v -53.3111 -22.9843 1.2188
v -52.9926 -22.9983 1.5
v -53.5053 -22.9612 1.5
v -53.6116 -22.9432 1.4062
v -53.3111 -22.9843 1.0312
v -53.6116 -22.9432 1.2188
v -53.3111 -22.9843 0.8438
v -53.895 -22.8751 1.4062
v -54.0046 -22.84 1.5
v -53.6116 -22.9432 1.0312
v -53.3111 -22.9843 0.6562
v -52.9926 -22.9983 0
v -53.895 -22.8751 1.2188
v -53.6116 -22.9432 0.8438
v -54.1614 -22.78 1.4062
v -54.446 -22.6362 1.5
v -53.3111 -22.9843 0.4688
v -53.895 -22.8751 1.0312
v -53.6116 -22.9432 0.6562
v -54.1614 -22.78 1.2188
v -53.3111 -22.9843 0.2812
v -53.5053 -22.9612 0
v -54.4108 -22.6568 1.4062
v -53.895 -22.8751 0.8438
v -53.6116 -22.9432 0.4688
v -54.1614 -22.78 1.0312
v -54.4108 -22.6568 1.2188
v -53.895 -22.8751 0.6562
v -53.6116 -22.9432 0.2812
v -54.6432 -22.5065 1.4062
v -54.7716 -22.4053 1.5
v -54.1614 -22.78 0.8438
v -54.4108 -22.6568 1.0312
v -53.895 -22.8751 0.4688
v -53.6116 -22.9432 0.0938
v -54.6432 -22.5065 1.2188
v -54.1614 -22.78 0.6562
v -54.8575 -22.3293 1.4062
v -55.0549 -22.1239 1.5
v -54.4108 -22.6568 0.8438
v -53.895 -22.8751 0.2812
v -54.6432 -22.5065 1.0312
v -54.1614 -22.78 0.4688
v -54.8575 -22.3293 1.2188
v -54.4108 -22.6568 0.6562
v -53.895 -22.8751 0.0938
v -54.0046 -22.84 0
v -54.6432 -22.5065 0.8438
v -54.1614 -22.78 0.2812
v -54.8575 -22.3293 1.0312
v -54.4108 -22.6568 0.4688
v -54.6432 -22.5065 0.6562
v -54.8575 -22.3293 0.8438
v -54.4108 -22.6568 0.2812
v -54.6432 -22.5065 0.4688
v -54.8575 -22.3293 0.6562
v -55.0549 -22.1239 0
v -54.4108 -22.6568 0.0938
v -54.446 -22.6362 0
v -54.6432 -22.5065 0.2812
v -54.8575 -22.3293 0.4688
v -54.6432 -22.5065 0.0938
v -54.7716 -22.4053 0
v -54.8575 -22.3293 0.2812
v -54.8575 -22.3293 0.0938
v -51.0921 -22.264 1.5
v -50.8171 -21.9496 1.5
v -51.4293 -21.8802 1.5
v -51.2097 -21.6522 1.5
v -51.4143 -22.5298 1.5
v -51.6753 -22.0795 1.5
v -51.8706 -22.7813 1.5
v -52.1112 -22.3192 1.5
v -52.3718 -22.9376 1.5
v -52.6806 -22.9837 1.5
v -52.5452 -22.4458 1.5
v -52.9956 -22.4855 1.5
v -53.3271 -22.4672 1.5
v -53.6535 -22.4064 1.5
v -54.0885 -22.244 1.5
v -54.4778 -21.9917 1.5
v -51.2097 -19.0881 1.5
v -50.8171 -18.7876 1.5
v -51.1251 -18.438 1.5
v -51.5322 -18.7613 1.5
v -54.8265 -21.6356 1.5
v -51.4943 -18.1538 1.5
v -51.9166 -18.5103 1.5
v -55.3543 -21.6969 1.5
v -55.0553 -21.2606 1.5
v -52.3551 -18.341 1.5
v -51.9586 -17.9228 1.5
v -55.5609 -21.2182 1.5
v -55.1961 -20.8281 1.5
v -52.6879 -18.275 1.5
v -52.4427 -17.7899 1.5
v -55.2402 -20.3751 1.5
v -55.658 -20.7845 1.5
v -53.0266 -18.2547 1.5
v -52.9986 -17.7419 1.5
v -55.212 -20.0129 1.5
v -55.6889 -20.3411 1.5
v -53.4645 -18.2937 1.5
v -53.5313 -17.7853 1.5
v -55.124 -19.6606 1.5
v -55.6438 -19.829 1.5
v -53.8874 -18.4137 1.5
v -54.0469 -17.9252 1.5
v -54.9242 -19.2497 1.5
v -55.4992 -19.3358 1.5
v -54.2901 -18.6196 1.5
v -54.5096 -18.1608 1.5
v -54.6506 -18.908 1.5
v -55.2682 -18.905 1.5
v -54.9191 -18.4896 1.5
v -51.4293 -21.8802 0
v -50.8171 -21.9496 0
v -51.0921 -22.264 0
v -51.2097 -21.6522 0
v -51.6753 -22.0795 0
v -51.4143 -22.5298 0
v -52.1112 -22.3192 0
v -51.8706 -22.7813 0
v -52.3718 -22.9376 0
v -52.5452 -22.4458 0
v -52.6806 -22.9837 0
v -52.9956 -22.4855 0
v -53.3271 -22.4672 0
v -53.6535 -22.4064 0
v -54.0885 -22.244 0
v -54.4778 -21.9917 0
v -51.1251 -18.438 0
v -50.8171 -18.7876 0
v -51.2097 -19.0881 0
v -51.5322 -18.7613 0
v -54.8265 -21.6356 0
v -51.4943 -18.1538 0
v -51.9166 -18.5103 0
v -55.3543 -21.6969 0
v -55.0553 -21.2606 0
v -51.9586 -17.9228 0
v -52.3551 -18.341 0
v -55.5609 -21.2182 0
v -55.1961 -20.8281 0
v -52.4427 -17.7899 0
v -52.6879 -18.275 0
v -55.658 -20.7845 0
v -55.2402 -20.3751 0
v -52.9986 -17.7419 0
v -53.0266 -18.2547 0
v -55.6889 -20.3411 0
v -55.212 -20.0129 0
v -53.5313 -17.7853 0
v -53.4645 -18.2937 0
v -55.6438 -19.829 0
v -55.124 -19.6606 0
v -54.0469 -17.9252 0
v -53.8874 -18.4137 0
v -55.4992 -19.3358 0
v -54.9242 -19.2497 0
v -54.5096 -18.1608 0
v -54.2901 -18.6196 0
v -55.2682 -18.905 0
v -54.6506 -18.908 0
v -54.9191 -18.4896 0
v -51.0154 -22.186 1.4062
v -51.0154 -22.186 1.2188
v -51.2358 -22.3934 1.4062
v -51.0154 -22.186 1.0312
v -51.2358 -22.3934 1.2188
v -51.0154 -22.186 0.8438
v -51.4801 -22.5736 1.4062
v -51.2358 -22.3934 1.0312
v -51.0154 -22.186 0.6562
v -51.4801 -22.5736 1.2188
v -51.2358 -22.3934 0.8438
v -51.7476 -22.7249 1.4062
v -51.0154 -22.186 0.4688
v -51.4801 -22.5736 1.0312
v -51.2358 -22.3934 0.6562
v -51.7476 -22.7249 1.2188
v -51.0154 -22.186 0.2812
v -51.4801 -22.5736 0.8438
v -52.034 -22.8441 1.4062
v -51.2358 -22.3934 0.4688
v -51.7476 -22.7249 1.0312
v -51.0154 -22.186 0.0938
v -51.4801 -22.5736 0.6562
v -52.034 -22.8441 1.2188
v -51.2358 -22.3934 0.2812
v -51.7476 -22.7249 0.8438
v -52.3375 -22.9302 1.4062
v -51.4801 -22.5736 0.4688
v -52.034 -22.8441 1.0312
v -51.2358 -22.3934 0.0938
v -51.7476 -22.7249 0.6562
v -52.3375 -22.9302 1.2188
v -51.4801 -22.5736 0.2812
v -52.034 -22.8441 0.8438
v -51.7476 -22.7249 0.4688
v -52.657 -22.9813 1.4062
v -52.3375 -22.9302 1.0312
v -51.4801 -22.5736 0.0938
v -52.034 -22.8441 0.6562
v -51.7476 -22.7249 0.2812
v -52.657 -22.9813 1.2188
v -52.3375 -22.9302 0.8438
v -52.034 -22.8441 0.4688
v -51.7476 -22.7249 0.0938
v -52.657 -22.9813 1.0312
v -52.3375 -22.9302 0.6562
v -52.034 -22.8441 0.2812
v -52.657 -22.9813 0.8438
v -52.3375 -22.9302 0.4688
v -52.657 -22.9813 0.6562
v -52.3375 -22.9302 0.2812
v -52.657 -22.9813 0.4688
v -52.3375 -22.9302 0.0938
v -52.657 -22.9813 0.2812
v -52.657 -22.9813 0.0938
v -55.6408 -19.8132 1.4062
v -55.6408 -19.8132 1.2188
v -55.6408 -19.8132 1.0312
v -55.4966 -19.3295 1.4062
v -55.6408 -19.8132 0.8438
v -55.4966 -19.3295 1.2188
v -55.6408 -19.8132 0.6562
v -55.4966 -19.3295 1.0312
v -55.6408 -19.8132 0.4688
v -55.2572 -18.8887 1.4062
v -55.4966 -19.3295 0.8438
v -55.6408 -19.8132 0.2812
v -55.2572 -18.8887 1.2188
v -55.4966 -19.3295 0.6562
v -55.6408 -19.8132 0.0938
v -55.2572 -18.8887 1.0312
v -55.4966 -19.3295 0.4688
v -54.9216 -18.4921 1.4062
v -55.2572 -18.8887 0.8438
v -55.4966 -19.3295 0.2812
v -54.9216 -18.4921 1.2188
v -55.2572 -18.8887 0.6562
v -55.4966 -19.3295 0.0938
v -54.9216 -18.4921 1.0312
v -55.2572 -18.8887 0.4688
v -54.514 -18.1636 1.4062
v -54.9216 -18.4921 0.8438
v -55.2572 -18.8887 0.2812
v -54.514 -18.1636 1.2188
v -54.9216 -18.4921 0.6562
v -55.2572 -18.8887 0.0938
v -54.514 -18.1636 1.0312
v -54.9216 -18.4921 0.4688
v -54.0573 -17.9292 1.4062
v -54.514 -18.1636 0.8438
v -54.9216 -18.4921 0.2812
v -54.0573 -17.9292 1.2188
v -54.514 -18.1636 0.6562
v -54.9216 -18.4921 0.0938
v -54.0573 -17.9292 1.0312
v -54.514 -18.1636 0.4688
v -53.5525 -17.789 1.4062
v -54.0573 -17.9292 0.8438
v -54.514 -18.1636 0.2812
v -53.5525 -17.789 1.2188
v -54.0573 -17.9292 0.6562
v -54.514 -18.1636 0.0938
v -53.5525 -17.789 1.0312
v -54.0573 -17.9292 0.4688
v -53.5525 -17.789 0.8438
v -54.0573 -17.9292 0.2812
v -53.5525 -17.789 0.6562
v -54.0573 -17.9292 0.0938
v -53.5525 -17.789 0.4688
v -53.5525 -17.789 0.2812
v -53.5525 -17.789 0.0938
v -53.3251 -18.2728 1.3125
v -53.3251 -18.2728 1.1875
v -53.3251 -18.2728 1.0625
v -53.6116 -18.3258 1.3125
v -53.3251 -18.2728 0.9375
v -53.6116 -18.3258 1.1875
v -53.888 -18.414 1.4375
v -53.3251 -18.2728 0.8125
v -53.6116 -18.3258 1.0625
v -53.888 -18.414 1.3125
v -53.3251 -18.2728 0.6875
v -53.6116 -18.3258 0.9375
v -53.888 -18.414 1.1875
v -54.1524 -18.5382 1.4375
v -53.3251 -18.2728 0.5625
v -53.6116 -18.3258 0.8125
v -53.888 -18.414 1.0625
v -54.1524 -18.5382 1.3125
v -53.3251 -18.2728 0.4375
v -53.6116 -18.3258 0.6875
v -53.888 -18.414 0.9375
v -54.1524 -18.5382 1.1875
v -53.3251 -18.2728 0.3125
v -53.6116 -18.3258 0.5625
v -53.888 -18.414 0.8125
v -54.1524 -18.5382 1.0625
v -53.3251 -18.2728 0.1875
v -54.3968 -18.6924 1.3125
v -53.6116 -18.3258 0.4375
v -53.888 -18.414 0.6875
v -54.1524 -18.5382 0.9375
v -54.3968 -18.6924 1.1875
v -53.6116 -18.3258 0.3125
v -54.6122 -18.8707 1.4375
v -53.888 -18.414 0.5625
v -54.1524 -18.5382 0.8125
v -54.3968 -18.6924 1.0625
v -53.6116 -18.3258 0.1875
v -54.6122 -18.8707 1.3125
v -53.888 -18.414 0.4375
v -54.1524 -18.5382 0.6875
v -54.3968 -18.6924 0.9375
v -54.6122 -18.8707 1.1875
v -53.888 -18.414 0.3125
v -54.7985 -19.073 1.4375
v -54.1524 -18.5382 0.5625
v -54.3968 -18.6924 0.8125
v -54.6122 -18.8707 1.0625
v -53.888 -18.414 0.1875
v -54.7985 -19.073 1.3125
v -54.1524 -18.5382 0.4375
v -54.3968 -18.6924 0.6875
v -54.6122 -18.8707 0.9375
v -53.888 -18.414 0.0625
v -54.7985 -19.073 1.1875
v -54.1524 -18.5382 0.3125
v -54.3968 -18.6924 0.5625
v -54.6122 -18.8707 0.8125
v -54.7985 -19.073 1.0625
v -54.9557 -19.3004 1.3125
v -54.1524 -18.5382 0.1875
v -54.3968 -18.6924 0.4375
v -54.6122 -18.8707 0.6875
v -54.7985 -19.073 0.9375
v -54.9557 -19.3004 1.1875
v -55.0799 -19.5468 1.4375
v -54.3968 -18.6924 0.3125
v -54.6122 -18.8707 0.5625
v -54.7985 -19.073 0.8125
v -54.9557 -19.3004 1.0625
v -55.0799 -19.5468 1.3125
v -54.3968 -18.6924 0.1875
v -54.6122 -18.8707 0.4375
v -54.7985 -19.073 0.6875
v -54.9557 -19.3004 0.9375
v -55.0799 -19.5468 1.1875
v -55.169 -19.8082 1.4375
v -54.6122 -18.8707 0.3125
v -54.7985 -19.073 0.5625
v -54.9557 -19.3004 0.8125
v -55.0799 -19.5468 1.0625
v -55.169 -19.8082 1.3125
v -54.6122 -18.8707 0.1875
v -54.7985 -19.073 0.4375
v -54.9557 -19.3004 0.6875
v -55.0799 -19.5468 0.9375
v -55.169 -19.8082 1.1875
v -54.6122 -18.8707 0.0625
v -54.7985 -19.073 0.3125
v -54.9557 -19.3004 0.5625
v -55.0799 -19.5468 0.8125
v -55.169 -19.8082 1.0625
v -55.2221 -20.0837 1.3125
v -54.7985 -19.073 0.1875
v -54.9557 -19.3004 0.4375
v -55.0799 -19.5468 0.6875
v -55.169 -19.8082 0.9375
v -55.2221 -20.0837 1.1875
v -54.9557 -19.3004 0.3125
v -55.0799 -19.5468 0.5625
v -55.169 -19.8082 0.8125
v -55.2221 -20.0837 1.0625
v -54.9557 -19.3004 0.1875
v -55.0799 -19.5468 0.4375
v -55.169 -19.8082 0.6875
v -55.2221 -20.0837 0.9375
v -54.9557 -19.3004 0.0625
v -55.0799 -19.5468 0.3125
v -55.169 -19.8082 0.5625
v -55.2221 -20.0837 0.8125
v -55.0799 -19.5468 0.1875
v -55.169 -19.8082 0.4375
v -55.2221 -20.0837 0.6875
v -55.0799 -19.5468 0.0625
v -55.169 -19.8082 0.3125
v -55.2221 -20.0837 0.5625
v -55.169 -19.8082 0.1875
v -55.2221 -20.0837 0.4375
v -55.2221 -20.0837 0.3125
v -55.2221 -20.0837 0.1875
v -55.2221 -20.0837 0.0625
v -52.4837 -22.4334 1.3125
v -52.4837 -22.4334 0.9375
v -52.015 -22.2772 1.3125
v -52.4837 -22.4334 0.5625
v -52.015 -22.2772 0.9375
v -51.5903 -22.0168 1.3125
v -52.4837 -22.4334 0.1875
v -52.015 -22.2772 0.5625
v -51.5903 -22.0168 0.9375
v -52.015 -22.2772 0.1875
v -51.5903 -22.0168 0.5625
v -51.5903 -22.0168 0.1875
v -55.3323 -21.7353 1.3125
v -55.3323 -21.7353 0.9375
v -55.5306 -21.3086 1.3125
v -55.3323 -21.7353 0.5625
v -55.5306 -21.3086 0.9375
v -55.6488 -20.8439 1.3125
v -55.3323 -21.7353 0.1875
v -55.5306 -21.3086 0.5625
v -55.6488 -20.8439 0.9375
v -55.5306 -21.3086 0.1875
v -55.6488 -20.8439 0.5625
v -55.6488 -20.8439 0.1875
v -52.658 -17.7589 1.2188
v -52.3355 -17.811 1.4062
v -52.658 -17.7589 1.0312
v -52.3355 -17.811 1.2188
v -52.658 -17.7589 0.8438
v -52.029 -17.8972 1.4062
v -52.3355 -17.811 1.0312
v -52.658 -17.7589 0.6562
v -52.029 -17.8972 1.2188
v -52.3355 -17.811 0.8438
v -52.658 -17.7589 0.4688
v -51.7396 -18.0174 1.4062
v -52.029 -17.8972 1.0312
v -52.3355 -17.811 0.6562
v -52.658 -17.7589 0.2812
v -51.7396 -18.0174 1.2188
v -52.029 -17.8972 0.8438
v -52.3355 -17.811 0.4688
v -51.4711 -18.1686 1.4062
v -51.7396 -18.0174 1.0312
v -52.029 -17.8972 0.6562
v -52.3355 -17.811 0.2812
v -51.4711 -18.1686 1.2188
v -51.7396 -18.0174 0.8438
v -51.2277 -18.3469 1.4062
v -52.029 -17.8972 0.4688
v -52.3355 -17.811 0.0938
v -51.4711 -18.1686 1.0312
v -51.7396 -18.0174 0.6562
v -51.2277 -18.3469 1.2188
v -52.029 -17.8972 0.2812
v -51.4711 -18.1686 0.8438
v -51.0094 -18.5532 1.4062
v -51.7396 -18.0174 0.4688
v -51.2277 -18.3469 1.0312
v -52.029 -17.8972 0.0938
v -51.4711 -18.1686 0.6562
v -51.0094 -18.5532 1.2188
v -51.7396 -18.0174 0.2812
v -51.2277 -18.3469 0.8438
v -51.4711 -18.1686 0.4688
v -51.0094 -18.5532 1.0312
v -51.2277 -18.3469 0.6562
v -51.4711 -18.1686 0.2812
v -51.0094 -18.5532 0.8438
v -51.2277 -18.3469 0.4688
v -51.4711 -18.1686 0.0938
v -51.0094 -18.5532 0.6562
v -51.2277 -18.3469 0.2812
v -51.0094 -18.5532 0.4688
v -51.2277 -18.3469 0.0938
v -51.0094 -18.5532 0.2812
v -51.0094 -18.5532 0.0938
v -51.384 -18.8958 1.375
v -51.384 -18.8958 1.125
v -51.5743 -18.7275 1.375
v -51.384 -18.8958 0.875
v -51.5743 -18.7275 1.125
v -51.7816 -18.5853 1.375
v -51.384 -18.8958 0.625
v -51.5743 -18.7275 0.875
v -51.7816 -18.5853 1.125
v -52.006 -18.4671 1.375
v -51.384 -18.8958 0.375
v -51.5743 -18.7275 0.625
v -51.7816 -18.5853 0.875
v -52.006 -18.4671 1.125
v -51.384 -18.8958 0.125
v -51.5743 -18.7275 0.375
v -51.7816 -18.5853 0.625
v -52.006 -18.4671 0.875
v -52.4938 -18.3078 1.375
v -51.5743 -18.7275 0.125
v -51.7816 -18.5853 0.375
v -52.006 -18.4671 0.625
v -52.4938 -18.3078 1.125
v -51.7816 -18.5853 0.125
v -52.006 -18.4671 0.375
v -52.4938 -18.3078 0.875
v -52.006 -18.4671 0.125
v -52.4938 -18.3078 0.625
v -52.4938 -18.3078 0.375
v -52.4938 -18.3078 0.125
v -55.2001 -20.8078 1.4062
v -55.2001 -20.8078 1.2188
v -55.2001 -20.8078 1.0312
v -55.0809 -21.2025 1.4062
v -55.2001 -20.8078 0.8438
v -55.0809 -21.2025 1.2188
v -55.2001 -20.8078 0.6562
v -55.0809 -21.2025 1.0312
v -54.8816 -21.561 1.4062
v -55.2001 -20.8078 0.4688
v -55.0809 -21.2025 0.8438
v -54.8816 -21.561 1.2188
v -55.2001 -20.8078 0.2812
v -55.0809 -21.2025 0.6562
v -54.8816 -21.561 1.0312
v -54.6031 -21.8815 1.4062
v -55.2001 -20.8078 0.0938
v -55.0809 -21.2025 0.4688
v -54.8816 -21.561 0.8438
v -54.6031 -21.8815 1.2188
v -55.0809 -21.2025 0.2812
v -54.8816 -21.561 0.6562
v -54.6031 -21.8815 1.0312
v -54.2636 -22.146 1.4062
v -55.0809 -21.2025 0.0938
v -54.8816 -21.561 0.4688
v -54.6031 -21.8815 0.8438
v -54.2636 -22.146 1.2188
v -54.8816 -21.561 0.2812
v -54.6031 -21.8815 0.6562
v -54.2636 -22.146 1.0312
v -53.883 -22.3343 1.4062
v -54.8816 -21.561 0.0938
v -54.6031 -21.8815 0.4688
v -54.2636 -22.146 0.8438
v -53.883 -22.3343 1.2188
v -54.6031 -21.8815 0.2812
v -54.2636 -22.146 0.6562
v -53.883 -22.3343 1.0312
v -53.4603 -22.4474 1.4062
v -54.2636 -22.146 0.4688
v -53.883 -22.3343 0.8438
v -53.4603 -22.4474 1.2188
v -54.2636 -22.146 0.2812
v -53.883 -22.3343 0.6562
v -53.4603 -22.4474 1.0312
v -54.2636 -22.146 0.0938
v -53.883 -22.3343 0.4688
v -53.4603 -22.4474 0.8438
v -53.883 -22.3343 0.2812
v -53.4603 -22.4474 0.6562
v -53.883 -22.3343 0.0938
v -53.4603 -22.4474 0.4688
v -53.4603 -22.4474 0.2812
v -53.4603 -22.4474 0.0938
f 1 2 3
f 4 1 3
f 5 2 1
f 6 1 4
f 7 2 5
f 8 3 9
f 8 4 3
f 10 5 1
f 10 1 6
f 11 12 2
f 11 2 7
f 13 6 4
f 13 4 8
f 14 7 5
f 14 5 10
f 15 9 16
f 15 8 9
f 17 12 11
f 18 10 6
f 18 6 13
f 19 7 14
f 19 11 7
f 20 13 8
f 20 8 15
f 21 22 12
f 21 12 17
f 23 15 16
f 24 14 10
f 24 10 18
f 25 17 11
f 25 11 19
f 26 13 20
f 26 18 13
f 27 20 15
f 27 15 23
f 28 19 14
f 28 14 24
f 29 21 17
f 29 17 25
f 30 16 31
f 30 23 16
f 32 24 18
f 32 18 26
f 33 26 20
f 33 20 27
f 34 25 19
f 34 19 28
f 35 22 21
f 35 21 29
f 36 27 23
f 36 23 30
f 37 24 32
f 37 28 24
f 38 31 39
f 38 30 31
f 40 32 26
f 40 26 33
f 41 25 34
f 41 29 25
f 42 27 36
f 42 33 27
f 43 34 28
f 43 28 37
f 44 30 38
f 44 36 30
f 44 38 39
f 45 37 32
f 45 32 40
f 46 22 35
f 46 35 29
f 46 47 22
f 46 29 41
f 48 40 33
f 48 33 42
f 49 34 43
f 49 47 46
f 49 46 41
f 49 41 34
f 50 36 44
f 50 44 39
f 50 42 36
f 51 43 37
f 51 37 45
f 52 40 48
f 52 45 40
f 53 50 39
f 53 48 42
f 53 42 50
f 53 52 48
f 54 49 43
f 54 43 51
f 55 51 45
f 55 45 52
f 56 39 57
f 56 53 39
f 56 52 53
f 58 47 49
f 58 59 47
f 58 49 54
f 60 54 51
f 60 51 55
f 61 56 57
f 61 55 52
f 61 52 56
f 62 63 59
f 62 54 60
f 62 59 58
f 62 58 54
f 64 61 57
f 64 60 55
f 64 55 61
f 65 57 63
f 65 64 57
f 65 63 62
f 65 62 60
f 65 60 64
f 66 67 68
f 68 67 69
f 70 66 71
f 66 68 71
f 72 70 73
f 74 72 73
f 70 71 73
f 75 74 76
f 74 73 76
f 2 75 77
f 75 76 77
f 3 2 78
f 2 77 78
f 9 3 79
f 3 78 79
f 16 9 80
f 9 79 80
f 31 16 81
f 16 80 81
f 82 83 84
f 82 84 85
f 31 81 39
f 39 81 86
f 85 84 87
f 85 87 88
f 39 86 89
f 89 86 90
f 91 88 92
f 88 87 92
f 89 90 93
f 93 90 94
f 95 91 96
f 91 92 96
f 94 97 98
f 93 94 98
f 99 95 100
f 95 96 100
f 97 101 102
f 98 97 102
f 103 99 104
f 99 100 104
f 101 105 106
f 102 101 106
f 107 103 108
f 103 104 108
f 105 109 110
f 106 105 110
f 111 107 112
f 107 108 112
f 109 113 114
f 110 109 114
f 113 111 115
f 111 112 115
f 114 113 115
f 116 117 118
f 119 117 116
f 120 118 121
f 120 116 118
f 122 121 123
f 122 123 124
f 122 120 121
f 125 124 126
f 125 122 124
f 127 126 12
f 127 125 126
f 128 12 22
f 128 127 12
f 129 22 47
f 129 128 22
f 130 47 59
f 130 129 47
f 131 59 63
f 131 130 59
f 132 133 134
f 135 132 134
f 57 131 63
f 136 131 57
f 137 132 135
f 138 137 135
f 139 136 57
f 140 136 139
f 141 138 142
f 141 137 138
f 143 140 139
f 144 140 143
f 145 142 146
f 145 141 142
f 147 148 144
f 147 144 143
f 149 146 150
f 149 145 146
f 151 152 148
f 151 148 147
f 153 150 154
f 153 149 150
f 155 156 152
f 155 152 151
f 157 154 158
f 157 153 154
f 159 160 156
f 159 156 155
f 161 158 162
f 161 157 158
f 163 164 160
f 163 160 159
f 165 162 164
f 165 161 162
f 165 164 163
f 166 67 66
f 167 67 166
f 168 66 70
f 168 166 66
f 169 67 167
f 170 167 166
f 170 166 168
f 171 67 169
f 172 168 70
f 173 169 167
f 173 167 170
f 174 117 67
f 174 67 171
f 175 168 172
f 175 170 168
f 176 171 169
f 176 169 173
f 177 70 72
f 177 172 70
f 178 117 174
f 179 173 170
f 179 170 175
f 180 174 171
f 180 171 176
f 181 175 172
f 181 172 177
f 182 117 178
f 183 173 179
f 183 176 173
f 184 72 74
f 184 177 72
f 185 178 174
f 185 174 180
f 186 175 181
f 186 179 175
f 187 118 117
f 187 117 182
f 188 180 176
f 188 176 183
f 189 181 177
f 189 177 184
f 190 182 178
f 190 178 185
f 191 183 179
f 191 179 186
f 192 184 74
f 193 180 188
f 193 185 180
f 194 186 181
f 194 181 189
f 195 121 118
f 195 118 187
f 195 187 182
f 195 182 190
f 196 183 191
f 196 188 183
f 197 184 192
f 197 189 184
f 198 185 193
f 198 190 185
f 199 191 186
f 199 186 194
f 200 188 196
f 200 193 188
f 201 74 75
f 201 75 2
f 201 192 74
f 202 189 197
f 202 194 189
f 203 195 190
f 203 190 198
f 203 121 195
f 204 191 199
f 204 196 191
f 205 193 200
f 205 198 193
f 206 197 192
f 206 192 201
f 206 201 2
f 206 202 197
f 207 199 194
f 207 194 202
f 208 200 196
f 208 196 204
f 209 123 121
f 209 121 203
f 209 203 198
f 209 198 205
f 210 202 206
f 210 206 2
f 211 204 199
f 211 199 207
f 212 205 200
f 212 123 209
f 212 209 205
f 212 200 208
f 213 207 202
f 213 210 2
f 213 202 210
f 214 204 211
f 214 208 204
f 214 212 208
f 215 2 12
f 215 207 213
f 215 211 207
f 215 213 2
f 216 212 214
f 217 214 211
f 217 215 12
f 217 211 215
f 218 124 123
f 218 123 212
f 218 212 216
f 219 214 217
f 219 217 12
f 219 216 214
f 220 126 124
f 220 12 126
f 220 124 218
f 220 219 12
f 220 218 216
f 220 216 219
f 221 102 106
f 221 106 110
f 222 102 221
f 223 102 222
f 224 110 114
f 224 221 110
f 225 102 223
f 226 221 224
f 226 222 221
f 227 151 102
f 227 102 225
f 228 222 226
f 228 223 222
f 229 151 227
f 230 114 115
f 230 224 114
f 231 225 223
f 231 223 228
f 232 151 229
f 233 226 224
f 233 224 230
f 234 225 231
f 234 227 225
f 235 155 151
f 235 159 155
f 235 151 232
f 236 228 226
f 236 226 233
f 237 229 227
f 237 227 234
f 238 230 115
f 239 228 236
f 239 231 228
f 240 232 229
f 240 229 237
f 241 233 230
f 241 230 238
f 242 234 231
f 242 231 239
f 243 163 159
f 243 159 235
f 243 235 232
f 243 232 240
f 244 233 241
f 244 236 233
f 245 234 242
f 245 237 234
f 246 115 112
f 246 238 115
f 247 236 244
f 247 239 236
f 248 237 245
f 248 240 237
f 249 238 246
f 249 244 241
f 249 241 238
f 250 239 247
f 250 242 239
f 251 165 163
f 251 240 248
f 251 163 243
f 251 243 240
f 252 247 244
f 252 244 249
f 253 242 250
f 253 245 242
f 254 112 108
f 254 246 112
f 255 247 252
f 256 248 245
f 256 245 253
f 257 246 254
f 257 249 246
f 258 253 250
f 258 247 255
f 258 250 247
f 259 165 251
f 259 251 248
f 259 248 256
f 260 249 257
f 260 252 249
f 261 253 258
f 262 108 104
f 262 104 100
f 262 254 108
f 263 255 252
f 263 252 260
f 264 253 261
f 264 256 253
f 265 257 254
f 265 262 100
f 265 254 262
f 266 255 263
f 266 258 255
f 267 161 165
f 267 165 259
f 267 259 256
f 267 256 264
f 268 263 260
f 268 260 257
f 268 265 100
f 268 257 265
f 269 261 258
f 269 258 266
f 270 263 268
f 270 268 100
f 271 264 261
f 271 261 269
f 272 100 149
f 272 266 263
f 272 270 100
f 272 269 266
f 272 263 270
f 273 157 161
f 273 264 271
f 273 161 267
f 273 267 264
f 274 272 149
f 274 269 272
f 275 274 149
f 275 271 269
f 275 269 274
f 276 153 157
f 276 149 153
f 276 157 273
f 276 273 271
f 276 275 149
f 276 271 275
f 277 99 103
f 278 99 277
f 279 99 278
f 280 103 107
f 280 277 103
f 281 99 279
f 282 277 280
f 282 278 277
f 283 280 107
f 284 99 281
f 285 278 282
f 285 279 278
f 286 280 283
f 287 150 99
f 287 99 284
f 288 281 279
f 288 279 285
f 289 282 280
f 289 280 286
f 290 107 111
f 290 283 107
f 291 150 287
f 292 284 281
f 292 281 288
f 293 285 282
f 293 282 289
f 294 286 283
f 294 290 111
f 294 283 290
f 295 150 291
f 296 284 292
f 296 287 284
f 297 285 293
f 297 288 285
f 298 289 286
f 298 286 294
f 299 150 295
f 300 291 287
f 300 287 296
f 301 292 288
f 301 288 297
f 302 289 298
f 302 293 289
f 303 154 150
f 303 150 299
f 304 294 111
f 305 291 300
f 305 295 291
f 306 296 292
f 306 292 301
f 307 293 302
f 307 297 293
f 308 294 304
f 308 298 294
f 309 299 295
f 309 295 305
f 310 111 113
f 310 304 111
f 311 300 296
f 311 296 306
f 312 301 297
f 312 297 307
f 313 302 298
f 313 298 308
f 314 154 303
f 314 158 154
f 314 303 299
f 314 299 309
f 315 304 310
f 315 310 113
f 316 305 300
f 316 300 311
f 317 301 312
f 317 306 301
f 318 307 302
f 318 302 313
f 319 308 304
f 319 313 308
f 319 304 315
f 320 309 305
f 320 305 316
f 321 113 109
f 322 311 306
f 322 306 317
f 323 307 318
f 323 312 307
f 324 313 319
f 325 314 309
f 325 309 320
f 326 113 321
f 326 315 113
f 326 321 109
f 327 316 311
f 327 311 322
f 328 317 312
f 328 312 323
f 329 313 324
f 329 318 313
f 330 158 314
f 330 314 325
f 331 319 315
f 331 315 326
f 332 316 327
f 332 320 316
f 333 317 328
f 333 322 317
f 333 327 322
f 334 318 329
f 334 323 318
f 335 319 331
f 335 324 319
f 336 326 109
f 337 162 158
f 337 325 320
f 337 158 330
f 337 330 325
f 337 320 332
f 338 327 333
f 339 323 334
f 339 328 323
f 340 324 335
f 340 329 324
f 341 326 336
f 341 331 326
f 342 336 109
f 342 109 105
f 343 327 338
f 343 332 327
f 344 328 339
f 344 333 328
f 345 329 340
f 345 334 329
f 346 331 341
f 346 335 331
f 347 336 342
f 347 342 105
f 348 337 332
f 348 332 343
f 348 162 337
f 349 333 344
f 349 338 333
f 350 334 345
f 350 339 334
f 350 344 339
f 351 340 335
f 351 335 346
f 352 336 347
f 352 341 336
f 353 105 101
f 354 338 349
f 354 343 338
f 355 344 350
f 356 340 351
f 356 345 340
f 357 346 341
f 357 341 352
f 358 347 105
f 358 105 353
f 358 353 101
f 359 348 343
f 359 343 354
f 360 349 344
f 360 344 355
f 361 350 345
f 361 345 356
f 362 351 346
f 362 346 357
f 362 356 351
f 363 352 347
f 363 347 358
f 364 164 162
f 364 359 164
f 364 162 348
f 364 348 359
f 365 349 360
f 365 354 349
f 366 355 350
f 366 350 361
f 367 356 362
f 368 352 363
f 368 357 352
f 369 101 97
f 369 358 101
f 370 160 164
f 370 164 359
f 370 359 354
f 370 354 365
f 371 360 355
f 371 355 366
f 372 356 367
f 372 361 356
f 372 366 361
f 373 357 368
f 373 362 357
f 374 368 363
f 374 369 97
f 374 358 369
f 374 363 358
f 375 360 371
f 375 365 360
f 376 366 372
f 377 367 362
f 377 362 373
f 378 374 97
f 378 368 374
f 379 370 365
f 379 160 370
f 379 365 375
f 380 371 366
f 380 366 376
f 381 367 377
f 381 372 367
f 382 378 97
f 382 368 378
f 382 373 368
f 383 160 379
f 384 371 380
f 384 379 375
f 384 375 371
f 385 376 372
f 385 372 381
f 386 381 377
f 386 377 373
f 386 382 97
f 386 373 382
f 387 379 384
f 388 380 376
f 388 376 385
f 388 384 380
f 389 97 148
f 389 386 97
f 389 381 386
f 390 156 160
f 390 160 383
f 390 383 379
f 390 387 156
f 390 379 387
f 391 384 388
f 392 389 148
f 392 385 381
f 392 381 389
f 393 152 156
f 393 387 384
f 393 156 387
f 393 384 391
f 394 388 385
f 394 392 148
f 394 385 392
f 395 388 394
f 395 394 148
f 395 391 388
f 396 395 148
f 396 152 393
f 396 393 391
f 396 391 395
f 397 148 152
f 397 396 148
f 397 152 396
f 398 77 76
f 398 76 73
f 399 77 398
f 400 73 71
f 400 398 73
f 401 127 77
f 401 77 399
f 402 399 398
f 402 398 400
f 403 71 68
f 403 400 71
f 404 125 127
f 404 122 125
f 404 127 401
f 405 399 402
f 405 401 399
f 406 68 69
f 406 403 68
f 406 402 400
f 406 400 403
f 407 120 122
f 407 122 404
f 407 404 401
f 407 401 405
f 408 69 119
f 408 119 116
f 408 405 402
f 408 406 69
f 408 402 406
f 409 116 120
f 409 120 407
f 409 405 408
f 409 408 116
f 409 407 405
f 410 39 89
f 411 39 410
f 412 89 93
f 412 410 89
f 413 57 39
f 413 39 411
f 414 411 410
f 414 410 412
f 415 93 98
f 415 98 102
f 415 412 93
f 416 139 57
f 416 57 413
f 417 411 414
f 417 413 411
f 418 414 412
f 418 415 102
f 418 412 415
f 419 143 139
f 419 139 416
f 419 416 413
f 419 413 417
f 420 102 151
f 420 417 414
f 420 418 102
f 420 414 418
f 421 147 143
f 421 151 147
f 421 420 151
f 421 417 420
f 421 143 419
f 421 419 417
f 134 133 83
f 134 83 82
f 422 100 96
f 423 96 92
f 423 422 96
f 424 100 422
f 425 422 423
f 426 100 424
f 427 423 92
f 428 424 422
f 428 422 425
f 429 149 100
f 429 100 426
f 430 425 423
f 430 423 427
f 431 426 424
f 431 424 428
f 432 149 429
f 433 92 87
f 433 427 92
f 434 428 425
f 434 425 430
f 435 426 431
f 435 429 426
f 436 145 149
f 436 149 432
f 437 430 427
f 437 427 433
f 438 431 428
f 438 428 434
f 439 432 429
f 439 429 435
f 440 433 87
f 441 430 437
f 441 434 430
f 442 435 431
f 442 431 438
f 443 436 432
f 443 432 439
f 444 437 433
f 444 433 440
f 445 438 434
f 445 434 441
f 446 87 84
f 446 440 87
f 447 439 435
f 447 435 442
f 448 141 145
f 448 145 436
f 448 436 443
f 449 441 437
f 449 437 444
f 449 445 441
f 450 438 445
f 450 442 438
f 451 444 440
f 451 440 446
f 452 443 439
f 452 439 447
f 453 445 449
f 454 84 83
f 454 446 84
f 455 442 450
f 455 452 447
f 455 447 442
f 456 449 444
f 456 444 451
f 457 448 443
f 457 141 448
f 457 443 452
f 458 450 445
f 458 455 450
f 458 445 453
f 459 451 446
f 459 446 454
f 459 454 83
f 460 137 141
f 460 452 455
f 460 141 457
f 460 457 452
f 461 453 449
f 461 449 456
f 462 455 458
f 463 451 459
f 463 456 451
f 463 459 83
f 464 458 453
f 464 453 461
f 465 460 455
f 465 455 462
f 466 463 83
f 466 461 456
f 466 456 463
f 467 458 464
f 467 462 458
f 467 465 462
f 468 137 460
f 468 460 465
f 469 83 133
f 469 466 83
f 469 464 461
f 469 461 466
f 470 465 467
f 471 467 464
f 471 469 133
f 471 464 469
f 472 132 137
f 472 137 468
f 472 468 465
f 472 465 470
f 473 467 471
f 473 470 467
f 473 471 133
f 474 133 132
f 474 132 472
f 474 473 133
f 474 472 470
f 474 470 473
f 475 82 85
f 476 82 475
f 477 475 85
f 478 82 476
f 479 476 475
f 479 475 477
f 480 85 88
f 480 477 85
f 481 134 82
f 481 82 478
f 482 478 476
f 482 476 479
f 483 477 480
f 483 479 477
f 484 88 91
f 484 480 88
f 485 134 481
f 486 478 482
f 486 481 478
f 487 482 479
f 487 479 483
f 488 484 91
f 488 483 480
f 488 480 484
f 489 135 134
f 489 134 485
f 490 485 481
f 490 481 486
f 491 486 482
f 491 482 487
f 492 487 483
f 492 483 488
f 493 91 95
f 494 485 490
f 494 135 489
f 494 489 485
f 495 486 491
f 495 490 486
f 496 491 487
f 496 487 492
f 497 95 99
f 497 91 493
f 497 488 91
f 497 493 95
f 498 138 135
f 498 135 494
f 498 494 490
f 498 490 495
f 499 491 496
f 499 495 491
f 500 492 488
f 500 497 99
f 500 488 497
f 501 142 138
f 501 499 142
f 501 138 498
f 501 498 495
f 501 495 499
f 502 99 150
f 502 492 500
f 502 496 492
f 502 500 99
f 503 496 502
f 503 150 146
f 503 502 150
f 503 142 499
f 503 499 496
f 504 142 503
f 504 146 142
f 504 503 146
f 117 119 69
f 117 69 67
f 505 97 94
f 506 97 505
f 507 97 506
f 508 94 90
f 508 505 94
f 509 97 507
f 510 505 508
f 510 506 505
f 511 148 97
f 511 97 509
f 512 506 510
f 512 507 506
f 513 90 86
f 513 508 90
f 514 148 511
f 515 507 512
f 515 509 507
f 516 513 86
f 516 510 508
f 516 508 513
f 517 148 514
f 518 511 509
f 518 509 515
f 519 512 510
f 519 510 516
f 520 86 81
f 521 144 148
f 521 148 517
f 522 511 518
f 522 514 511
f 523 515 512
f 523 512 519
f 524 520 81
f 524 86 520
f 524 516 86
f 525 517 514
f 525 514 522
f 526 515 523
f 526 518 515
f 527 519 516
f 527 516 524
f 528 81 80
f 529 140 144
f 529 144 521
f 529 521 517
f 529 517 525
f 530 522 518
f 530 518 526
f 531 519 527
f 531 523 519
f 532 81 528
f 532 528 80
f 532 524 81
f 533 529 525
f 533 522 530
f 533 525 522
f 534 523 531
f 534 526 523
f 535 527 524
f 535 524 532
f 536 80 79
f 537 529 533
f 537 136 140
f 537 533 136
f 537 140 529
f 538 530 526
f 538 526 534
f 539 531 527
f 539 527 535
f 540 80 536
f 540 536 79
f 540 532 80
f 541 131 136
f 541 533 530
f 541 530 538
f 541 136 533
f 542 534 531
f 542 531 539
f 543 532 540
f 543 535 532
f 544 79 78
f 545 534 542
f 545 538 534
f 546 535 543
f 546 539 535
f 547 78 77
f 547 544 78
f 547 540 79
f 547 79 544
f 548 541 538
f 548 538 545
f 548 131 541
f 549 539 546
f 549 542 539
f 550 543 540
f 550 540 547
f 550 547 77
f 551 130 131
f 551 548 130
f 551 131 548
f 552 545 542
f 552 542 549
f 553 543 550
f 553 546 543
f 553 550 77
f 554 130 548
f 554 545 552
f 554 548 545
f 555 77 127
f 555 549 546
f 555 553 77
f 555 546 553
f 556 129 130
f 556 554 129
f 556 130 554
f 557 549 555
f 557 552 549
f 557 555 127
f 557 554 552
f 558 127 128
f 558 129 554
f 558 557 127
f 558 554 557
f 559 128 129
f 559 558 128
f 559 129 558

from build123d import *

# Parameters (mm, degrees)
BOSS_EXTRU_1_DEPTH = 1.5


with BuildPart() as part:
    # Esquisse1 → Boss.-Extru.1 (new body)
    with BuildSketch(Plane.XY):
        with BuildLine():
            Line((-50.81708071, -18.787587025), (-51.209708916, -19.088067794))
            add(Edge.make_bspline(
                [(-51.209708916, -19.088067794), (-51.237717328, -19.054687837), (-51.293356537, -18.988377958), (-51.382869684, -18.895264323), (-51.476157745, -18.808028235), (-51.573185061, -18.726254121), (-51.675698089, -18.652801599), (-51.781213516, -18.58384288), (-51.891496437, -18.522031826), (-52.043998915, -18.447084703), (-52.243495841, -18.36887591), (-52.494631326, -18.303299865), (-52.756790038, -18.261555329), (-52.935643752, -18.257034127), (-53.026615967, -18.254734461)],
                knots=[0, 0, 0, 0, 0.757959112, 1.505699292, 2.245454638, 2.979532153, 3.711538275, 4.438200793, 5.171680507, 5.909471876, 7.393775596, 8.890124382, 10.418191784, 12, 12, 12, 12], degree=3))
            add(Edge.make_bspline(
                [(-53.026615967, -18.254734461), (-53.076734966, -18.25531155), (-53.176507812, -18.256460373), (-53.32457706, -18.271616266), (-53.469881419, -18.292917995), (-53.612326371, -18.324525599), (-53.751730597, -18.364486484), (-53.889005457, -18.412237075), (-54.022163457, -18.471315418), (-54.153046655, -18.536612932), (-54.278445527, -18.610366424), (-54.397095596, -18.69081407), (-54.508564121, -18.777055636), (-54.612939281, -18.86941436), (-54.710327779, -18.967474303), (-54.800023937, -19.072280505), (-54.881717381, -19.183497896), (-54.957027416, -19.299659907), (-55.024474178, -19.420428181), (-55.080945435, -19.54624971), (-55.130952752, -19.674969857), (-55.170523099, -19.808042944), (-55.201843837, -19.944532609), (-55.223454785, -20.084805164), (-55.238438315, -20.228567563), (-55.239581425, -20.326009438), (-55.240157634, -20.375127089)],
                knots=[0, 0, 0, 0, 1.054917814, 2.100044995, 3.131103042, 4.146048494, 5.169673617, 6.183595914, 7.203665975, 8.234915748, 9.262203917, 10.264457458, 11.251630812, 12.227803204, 13.197192746, 14.159520551, 15.12972552, 16.100847026, 17.073214652, 18.039054194, 19.002613845, 19.979014051, 20.95965708, 21.949030935, 22.966165397, 24, 24, 24, 24], degree=3))
            add(Edge.make_bspline(
                [(-55.240157634, -20.375127089), (-55.238355035, -20.449028975), (-55.234815872, -20.594125524), (-55.203318252, -20.806654968), (-55.155453835, -21.010255931), (-55.083717297, -21.203655705), (-54.99526151, -21.389239074), (-54.883489208, -21.563866007), (-54.754037012, -21.730175385), (-54.605073556, -21.884236739), (-54.441636676, -22.024970633), (-54.266282516, -22.148900035), (-54.079447819, -22.25220701), (-53.883195491, -22.338172648), (-53.676015328, -22.404253687), (-53.458279896, -22.450773863), (-53.23046276, -22.481119836), (-53.074792189, -22.484025104), (-52.995566287, -22.485503692)],
                knots=[0, 0, 0, 0, 1.029171465, 2.020641659, 2.987623507, 3.938342917, 4.889210282, 5.84687017, 6.821220943, 7.821438502, 8.827599549, 9.822697543, 10.807740252, 11.797342354, 12.80366471, 13.83203677, 14.896651826, 16, 16, 16, 16], degree=3))
            add(Edge.make_bspline(
                [(-52.995566287, -22.485503692), (-52.908276732, -22.483091149), (-52.736470005, -22.478342688), (-52.484515681, -22.43811519), (-52.24332173, -22.372889593), (-52.012875178, -22.281606847), (-51.793825684, -22.16294215), (-51.585830455, -22.019088039), (-51.388713925, -21.848676135), (-51.270183522, -21.71855738), (-51.209708916, -21.652170358)],
                knots=[0, 0, 0, 0, 1.028121516, 2.023589091, 2.998037872, 3.967518031, 4.937445131, 5.927275754, 6.942489185, 8, 8, 8, 8], degree=3))
            Line((-51.209708916, -21.652170358), (-50.81708071, -21.94964632))
            add(Edge.make_bspline(
                [(-50.81708071, -21.94964632), (-50.84867801, -21.990415537), (-50.911721261, -22.071758689), (-51.013804142, -22.18643256), (-51.121343138, -22.294295468), (-51.23513701, -22.394477784), (-51.353876712, -22.488984163), (-51.479694301, -22.575129636), (-51.610935776, -22.654116614), (-51.74715646, -22.726440792), (-51.888211621, -22.790608287), (-52.033932243, -22.845542241), (-52.183690208, -22.892863512), (-52.337492363, -22.93179485), (-52.49565773, -22.962182113), (-52.65761555, -22.982495934), (-52.823715371, -22.996412955), (-52.935774544, -22.997681406), (-52.99256148, -22.998324204)],
                knots=[0, 0, 0, 0, 0.986787822, 1.968848986, 2.935600012, 3.899624008, 4.868462664, 5.837806735, 6.815139263, 7.798259679, 8.787526145, 9.778297419, 10.776456485, 11.791383307, 12.812564526, 13.85620153, 14.913611965, 16, 16, 16, 16], degree=3))
            add(Edge.make_bspline(
                [(-52.99256148, -22.998324204), (-53.046338147, -22.997949929), (-53.152674847, -22.997209847), (-53.309673064, -22.985221036), (-53.462515322, -22.968864269), (-53.610764787, -22.94423551), (-53.755230466, -22.915172168), (-53.89460273, -22.876213229), (-54.03025303, -22.832571563), (-54.161636374, -22.781278725), (-54.288864517, -22.723398464), (-54.411527104, -22.657981951), (-54.529567722, -22.585579287), (-54.644146895, -22.507786415), (-54.753572014, -22.422104556), (-54.858791336, -22.329723649), (-54.960394874, -22.230955062), (-55.023255852, -22.159733843), (-55.054861159, -22.123925166)],
                knots=[0, 0, 0, 0, 1.114604814, 2.203992996, 3.262667896, 4.300477797, 5.318619304, 6.316056647, 7.298880507, 8.271930387, 9.238335007, 10.195173496, 11.151986948, 12.108099108, 13.064862484, 14.031167946, 15.010108607, 16, 16, 16, 16], degree=3))
            add(Edge.make_bspline(
                [(-55.054861159, -22.123925166), (-55.105483507, -22.061723468), (-55.206117045, -21.938071024), (-55.334868022, -21.737662479), (-55.445078815, -21.528422181), (-55.534187273, -21.309250854), (-55.603848321, -21.080640301), (-55.652107171, -20.84247528), (-55.683466606, -20.59497822), (-55.687052733, -20.426639951), (-55.688875582, -20.341072602)],
                knots=[0, 0, 0, 0, 0.994628077, 1.977248131, 2.950237994, 3.925870899, 4.908910175, 5.911660606, 6.938484602, 8, 8, 8, 8], degree=3))
            add(Edge.make_bspline(
                [(-55.688875582, -20.341072602), (-55.686653877, -20.25113624), (-55.682282811, -20.074192062), (-55.64514596, -19.814514986), (-55.585404823, -19.565727273), (-55.500552125, -19.328293352), (-55.392973052, -19.10096438), (-55.260077889, -18.885476945), (-55.103410543, -18.680452945), (-54.924199732, -18.489003301), (-54.727674967, -18.313947083), (-54.517219519, -18.15993822), (-54.293245309, -18.03177034), (-54.058219807, -17.924632965), (-53.810383119, -17.842283732), (-53.55026402, -17.784636323), (-53.278351285, -17.748754728), (-53.092833534, -17.744218717), (-52.998571095, -17.741913948)],
                knots=[0, 0, 0, 0, 1.032925535, 2.032216505, 3.007276963, 3.968222605, 4.92396291, 5.891752235, 6.871517503, 7.883894988, 8.900124299, 9.891468569, 10.874487609, 11.85992873, 12.854644235, 13.869047385, 14.917252991, 16, 16, 16, 16], degree=3))
            add(Edge.make_bspline(
                [(-52.998571095, -17.741913948), (-52.941121849, -17.742602717), (-52.827406853, -17.743966065), (-52.659188778, -17.757260554), (-52.495414026, -17.779422849), (-52.335969766, -17.809588663), (-52.180080314, -17.847027693), (-52.028937113, -17.895799548), (-51.881653274, -17.951566022), (-51.739157691, -18.015792401), (-51.602134048, -18.087887746), (-51.470625022, -18.167052923), (-51.345675224, -18.253189788), (-51.22640544, -18.345565753), (-51.114810853, -18.446135123), (-51.007723026, -18.552131689), (-50.908778629, -18.66660858), (-50.847702636, -18.747187057), (-50.81708071, -18.787587025)],
                knots=[0, 0, 0, 0, 1.096760587, 2.17092713, 3.219439832, 4.250915756, 5.268269357, 6.278326846, 7.281116186, 8.274029601, 9.260640565, 10.235837813, 11.203064059, 12.156899882, 13.114053108, 14.069676657, 15.032185724, 16, 16, 16, 16], degree=3))
        make_face()
    extrude(amount=BOSS_EXTRU_1_DEPTH)


solid = part.part
